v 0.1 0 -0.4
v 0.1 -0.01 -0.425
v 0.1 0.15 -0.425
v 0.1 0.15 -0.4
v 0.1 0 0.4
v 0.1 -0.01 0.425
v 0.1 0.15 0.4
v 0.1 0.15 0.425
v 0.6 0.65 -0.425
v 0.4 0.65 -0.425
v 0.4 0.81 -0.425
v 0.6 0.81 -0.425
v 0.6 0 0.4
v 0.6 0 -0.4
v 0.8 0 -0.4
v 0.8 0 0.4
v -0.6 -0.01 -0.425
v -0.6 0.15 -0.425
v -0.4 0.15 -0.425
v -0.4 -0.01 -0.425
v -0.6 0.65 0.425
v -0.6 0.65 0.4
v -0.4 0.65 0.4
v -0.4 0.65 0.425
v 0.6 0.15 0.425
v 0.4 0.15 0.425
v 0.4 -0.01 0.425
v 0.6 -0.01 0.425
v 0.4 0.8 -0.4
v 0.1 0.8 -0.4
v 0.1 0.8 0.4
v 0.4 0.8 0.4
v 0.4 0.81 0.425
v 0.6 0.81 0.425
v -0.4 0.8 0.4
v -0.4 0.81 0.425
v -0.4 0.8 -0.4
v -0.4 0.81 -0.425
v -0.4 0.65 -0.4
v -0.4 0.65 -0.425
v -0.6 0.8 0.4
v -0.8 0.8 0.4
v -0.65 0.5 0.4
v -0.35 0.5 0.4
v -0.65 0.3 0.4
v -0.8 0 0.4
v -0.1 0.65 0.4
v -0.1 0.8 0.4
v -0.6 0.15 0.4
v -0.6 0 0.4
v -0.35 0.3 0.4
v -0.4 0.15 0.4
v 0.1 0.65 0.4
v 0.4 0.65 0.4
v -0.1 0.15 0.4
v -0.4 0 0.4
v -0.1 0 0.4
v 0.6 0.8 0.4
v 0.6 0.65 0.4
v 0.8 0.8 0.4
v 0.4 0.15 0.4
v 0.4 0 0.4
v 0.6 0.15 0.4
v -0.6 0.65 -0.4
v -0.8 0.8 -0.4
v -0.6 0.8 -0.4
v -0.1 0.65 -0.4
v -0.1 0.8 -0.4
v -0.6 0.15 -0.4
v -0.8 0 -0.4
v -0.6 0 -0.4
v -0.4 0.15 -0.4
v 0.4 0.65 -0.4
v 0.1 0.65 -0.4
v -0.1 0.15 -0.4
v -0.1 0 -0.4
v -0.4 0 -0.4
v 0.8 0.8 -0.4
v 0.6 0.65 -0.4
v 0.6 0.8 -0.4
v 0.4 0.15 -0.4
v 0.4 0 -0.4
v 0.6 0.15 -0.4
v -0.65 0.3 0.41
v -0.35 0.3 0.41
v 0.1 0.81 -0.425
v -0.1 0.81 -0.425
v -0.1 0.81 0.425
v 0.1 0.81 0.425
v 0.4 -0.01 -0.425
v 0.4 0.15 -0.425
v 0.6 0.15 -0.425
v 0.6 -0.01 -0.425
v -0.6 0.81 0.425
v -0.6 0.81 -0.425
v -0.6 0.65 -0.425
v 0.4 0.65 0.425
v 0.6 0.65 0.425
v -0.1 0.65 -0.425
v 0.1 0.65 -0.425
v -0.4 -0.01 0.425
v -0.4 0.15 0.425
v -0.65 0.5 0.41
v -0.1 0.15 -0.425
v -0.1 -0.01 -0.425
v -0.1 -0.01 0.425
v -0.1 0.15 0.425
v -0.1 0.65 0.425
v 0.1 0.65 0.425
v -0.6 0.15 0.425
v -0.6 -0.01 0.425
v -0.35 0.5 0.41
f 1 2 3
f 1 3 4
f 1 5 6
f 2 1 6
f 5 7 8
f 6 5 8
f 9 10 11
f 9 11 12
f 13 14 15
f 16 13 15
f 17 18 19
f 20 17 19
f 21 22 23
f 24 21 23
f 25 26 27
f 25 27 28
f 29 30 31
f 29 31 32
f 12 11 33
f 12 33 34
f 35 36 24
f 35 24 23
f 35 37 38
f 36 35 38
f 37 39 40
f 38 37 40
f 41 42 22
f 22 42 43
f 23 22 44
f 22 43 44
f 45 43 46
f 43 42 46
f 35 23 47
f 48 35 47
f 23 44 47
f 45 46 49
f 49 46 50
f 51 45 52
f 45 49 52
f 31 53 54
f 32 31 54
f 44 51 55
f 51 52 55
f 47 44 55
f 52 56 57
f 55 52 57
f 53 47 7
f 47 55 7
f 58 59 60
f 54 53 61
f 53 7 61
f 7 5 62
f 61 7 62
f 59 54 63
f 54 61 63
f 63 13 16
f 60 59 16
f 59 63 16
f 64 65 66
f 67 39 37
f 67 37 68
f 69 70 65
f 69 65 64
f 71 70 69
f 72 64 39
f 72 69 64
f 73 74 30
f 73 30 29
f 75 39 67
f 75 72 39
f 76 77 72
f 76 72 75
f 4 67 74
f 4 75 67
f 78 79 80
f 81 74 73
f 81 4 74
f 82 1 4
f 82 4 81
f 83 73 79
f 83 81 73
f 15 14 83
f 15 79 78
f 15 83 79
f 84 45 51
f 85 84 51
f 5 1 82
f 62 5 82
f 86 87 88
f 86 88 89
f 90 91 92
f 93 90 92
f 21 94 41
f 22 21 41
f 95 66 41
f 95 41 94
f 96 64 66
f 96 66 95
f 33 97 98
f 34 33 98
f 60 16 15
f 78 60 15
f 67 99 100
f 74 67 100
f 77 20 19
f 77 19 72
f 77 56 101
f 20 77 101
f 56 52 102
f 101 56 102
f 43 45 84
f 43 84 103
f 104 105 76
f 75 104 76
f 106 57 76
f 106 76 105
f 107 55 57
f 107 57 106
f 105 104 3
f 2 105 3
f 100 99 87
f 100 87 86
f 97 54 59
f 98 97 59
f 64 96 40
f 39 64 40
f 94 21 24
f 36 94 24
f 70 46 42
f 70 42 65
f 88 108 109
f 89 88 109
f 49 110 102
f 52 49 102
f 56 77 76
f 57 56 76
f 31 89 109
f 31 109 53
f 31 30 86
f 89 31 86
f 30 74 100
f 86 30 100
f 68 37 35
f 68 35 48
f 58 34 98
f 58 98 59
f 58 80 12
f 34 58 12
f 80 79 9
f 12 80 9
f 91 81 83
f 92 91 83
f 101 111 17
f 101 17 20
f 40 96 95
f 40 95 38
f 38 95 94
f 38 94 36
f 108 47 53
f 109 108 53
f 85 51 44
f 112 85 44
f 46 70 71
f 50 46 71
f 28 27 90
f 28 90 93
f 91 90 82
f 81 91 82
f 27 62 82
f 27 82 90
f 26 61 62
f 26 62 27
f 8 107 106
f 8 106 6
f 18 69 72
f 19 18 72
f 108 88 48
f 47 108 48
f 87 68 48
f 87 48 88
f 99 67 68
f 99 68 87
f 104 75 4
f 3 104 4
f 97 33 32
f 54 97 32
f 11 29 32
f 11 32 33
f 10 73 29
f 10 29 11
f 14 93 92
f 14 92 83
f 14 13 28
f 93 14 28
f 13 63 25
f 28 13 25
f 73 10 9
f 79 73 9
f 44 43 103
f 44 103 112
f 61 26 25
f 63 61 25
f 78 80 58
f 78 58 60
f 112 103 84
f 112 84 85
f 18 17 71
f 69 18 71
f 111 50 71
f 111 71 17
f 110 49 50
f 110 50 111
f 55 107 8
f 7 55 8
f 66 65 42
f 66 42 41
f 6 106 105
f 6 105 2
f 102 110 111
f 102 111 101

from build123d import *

# Parameters (mm, degrees)
SKETCH_1_W      = 1.6
SKETCH_1_H      = 0.8
EXTRUDE_1_DEPTH = 0.8
EXTRUDE_START   = -0.15
SKETCH_2_W      = 0.2
SKETCH_2_H      = 0.85
EXTRUDE_2_DEPTH = 0.16
SKETCH_3_W      = 0.2
SKETCH_3_H      = 0.85
EXTRUDE_3_DEPTH = 0.16
SKETCH_4_W      = 0.3
SKETCH_4_H      = 0.2
EXTRUDE_4_DEPTH = 0.01


with BuildPart() as part:
    # Эскиз1 → Бобышка-Вытянуть1 (new body)
    with BuildSketch(Plane(origin=(0, 0, 0), x_dir=(1, 0, 0), z_dir=(0, 1, 0))):
        Rectangle(SKETCH_1_W, SKETCH_1_H)
    extrude(amount=EXTRUDE_1_DEPTH)

    # Эскиз2 → Бобышка-Вытянуть2 (add)
    with BuildSketch(Plane(origin=(0, 0.8, 0), x_dir=(1, 0, 0), z_dir=(0, 1, 0)).offset(EXTRUDE_START)):
        with Locations((-0.5, 0)):
            Rectangle(SKETCH_2_W, SKETCH_2_H)
        Rectangle(SKETCH_2_W, SKETCH_2_H)
        with Locations((0.5, 0)):
            Rectangle(SKETCH_2_W, SKETCH_2_H)
    extrude(amount=EXTRUDE_2_DEPTH)

    # Эскиз3 → Бобышка-Вытянуть3 (add)
    with BuildSketch(Plane.XZ.offset(EXTRUDE_START)):
        with Locations((-0.5, 0)):
            Rectangle(SKETCH_3_W, SKETCH_3_H)
        Rectangle(SKETCH_3_W, SKETCH_3_H)
        with Locations((0.5, 0)):
            Rectangle(SKETCH_3_W, SKETCH_3_H)
    extrude(amount=EXTRUDE_3_DEPTH)

    # Эскиз4 → Бобышка-Вытянуть4 (add)
    with BuildSketch(Plane.XY.offset(0.4)):
        with Locations((-0.5, 0.4)):
            Rectangle(SKETCH_4_W, SKETCH_4_H)
    extrude(amount=EXTRUDE_4_DEPTH)


solid = part.part
